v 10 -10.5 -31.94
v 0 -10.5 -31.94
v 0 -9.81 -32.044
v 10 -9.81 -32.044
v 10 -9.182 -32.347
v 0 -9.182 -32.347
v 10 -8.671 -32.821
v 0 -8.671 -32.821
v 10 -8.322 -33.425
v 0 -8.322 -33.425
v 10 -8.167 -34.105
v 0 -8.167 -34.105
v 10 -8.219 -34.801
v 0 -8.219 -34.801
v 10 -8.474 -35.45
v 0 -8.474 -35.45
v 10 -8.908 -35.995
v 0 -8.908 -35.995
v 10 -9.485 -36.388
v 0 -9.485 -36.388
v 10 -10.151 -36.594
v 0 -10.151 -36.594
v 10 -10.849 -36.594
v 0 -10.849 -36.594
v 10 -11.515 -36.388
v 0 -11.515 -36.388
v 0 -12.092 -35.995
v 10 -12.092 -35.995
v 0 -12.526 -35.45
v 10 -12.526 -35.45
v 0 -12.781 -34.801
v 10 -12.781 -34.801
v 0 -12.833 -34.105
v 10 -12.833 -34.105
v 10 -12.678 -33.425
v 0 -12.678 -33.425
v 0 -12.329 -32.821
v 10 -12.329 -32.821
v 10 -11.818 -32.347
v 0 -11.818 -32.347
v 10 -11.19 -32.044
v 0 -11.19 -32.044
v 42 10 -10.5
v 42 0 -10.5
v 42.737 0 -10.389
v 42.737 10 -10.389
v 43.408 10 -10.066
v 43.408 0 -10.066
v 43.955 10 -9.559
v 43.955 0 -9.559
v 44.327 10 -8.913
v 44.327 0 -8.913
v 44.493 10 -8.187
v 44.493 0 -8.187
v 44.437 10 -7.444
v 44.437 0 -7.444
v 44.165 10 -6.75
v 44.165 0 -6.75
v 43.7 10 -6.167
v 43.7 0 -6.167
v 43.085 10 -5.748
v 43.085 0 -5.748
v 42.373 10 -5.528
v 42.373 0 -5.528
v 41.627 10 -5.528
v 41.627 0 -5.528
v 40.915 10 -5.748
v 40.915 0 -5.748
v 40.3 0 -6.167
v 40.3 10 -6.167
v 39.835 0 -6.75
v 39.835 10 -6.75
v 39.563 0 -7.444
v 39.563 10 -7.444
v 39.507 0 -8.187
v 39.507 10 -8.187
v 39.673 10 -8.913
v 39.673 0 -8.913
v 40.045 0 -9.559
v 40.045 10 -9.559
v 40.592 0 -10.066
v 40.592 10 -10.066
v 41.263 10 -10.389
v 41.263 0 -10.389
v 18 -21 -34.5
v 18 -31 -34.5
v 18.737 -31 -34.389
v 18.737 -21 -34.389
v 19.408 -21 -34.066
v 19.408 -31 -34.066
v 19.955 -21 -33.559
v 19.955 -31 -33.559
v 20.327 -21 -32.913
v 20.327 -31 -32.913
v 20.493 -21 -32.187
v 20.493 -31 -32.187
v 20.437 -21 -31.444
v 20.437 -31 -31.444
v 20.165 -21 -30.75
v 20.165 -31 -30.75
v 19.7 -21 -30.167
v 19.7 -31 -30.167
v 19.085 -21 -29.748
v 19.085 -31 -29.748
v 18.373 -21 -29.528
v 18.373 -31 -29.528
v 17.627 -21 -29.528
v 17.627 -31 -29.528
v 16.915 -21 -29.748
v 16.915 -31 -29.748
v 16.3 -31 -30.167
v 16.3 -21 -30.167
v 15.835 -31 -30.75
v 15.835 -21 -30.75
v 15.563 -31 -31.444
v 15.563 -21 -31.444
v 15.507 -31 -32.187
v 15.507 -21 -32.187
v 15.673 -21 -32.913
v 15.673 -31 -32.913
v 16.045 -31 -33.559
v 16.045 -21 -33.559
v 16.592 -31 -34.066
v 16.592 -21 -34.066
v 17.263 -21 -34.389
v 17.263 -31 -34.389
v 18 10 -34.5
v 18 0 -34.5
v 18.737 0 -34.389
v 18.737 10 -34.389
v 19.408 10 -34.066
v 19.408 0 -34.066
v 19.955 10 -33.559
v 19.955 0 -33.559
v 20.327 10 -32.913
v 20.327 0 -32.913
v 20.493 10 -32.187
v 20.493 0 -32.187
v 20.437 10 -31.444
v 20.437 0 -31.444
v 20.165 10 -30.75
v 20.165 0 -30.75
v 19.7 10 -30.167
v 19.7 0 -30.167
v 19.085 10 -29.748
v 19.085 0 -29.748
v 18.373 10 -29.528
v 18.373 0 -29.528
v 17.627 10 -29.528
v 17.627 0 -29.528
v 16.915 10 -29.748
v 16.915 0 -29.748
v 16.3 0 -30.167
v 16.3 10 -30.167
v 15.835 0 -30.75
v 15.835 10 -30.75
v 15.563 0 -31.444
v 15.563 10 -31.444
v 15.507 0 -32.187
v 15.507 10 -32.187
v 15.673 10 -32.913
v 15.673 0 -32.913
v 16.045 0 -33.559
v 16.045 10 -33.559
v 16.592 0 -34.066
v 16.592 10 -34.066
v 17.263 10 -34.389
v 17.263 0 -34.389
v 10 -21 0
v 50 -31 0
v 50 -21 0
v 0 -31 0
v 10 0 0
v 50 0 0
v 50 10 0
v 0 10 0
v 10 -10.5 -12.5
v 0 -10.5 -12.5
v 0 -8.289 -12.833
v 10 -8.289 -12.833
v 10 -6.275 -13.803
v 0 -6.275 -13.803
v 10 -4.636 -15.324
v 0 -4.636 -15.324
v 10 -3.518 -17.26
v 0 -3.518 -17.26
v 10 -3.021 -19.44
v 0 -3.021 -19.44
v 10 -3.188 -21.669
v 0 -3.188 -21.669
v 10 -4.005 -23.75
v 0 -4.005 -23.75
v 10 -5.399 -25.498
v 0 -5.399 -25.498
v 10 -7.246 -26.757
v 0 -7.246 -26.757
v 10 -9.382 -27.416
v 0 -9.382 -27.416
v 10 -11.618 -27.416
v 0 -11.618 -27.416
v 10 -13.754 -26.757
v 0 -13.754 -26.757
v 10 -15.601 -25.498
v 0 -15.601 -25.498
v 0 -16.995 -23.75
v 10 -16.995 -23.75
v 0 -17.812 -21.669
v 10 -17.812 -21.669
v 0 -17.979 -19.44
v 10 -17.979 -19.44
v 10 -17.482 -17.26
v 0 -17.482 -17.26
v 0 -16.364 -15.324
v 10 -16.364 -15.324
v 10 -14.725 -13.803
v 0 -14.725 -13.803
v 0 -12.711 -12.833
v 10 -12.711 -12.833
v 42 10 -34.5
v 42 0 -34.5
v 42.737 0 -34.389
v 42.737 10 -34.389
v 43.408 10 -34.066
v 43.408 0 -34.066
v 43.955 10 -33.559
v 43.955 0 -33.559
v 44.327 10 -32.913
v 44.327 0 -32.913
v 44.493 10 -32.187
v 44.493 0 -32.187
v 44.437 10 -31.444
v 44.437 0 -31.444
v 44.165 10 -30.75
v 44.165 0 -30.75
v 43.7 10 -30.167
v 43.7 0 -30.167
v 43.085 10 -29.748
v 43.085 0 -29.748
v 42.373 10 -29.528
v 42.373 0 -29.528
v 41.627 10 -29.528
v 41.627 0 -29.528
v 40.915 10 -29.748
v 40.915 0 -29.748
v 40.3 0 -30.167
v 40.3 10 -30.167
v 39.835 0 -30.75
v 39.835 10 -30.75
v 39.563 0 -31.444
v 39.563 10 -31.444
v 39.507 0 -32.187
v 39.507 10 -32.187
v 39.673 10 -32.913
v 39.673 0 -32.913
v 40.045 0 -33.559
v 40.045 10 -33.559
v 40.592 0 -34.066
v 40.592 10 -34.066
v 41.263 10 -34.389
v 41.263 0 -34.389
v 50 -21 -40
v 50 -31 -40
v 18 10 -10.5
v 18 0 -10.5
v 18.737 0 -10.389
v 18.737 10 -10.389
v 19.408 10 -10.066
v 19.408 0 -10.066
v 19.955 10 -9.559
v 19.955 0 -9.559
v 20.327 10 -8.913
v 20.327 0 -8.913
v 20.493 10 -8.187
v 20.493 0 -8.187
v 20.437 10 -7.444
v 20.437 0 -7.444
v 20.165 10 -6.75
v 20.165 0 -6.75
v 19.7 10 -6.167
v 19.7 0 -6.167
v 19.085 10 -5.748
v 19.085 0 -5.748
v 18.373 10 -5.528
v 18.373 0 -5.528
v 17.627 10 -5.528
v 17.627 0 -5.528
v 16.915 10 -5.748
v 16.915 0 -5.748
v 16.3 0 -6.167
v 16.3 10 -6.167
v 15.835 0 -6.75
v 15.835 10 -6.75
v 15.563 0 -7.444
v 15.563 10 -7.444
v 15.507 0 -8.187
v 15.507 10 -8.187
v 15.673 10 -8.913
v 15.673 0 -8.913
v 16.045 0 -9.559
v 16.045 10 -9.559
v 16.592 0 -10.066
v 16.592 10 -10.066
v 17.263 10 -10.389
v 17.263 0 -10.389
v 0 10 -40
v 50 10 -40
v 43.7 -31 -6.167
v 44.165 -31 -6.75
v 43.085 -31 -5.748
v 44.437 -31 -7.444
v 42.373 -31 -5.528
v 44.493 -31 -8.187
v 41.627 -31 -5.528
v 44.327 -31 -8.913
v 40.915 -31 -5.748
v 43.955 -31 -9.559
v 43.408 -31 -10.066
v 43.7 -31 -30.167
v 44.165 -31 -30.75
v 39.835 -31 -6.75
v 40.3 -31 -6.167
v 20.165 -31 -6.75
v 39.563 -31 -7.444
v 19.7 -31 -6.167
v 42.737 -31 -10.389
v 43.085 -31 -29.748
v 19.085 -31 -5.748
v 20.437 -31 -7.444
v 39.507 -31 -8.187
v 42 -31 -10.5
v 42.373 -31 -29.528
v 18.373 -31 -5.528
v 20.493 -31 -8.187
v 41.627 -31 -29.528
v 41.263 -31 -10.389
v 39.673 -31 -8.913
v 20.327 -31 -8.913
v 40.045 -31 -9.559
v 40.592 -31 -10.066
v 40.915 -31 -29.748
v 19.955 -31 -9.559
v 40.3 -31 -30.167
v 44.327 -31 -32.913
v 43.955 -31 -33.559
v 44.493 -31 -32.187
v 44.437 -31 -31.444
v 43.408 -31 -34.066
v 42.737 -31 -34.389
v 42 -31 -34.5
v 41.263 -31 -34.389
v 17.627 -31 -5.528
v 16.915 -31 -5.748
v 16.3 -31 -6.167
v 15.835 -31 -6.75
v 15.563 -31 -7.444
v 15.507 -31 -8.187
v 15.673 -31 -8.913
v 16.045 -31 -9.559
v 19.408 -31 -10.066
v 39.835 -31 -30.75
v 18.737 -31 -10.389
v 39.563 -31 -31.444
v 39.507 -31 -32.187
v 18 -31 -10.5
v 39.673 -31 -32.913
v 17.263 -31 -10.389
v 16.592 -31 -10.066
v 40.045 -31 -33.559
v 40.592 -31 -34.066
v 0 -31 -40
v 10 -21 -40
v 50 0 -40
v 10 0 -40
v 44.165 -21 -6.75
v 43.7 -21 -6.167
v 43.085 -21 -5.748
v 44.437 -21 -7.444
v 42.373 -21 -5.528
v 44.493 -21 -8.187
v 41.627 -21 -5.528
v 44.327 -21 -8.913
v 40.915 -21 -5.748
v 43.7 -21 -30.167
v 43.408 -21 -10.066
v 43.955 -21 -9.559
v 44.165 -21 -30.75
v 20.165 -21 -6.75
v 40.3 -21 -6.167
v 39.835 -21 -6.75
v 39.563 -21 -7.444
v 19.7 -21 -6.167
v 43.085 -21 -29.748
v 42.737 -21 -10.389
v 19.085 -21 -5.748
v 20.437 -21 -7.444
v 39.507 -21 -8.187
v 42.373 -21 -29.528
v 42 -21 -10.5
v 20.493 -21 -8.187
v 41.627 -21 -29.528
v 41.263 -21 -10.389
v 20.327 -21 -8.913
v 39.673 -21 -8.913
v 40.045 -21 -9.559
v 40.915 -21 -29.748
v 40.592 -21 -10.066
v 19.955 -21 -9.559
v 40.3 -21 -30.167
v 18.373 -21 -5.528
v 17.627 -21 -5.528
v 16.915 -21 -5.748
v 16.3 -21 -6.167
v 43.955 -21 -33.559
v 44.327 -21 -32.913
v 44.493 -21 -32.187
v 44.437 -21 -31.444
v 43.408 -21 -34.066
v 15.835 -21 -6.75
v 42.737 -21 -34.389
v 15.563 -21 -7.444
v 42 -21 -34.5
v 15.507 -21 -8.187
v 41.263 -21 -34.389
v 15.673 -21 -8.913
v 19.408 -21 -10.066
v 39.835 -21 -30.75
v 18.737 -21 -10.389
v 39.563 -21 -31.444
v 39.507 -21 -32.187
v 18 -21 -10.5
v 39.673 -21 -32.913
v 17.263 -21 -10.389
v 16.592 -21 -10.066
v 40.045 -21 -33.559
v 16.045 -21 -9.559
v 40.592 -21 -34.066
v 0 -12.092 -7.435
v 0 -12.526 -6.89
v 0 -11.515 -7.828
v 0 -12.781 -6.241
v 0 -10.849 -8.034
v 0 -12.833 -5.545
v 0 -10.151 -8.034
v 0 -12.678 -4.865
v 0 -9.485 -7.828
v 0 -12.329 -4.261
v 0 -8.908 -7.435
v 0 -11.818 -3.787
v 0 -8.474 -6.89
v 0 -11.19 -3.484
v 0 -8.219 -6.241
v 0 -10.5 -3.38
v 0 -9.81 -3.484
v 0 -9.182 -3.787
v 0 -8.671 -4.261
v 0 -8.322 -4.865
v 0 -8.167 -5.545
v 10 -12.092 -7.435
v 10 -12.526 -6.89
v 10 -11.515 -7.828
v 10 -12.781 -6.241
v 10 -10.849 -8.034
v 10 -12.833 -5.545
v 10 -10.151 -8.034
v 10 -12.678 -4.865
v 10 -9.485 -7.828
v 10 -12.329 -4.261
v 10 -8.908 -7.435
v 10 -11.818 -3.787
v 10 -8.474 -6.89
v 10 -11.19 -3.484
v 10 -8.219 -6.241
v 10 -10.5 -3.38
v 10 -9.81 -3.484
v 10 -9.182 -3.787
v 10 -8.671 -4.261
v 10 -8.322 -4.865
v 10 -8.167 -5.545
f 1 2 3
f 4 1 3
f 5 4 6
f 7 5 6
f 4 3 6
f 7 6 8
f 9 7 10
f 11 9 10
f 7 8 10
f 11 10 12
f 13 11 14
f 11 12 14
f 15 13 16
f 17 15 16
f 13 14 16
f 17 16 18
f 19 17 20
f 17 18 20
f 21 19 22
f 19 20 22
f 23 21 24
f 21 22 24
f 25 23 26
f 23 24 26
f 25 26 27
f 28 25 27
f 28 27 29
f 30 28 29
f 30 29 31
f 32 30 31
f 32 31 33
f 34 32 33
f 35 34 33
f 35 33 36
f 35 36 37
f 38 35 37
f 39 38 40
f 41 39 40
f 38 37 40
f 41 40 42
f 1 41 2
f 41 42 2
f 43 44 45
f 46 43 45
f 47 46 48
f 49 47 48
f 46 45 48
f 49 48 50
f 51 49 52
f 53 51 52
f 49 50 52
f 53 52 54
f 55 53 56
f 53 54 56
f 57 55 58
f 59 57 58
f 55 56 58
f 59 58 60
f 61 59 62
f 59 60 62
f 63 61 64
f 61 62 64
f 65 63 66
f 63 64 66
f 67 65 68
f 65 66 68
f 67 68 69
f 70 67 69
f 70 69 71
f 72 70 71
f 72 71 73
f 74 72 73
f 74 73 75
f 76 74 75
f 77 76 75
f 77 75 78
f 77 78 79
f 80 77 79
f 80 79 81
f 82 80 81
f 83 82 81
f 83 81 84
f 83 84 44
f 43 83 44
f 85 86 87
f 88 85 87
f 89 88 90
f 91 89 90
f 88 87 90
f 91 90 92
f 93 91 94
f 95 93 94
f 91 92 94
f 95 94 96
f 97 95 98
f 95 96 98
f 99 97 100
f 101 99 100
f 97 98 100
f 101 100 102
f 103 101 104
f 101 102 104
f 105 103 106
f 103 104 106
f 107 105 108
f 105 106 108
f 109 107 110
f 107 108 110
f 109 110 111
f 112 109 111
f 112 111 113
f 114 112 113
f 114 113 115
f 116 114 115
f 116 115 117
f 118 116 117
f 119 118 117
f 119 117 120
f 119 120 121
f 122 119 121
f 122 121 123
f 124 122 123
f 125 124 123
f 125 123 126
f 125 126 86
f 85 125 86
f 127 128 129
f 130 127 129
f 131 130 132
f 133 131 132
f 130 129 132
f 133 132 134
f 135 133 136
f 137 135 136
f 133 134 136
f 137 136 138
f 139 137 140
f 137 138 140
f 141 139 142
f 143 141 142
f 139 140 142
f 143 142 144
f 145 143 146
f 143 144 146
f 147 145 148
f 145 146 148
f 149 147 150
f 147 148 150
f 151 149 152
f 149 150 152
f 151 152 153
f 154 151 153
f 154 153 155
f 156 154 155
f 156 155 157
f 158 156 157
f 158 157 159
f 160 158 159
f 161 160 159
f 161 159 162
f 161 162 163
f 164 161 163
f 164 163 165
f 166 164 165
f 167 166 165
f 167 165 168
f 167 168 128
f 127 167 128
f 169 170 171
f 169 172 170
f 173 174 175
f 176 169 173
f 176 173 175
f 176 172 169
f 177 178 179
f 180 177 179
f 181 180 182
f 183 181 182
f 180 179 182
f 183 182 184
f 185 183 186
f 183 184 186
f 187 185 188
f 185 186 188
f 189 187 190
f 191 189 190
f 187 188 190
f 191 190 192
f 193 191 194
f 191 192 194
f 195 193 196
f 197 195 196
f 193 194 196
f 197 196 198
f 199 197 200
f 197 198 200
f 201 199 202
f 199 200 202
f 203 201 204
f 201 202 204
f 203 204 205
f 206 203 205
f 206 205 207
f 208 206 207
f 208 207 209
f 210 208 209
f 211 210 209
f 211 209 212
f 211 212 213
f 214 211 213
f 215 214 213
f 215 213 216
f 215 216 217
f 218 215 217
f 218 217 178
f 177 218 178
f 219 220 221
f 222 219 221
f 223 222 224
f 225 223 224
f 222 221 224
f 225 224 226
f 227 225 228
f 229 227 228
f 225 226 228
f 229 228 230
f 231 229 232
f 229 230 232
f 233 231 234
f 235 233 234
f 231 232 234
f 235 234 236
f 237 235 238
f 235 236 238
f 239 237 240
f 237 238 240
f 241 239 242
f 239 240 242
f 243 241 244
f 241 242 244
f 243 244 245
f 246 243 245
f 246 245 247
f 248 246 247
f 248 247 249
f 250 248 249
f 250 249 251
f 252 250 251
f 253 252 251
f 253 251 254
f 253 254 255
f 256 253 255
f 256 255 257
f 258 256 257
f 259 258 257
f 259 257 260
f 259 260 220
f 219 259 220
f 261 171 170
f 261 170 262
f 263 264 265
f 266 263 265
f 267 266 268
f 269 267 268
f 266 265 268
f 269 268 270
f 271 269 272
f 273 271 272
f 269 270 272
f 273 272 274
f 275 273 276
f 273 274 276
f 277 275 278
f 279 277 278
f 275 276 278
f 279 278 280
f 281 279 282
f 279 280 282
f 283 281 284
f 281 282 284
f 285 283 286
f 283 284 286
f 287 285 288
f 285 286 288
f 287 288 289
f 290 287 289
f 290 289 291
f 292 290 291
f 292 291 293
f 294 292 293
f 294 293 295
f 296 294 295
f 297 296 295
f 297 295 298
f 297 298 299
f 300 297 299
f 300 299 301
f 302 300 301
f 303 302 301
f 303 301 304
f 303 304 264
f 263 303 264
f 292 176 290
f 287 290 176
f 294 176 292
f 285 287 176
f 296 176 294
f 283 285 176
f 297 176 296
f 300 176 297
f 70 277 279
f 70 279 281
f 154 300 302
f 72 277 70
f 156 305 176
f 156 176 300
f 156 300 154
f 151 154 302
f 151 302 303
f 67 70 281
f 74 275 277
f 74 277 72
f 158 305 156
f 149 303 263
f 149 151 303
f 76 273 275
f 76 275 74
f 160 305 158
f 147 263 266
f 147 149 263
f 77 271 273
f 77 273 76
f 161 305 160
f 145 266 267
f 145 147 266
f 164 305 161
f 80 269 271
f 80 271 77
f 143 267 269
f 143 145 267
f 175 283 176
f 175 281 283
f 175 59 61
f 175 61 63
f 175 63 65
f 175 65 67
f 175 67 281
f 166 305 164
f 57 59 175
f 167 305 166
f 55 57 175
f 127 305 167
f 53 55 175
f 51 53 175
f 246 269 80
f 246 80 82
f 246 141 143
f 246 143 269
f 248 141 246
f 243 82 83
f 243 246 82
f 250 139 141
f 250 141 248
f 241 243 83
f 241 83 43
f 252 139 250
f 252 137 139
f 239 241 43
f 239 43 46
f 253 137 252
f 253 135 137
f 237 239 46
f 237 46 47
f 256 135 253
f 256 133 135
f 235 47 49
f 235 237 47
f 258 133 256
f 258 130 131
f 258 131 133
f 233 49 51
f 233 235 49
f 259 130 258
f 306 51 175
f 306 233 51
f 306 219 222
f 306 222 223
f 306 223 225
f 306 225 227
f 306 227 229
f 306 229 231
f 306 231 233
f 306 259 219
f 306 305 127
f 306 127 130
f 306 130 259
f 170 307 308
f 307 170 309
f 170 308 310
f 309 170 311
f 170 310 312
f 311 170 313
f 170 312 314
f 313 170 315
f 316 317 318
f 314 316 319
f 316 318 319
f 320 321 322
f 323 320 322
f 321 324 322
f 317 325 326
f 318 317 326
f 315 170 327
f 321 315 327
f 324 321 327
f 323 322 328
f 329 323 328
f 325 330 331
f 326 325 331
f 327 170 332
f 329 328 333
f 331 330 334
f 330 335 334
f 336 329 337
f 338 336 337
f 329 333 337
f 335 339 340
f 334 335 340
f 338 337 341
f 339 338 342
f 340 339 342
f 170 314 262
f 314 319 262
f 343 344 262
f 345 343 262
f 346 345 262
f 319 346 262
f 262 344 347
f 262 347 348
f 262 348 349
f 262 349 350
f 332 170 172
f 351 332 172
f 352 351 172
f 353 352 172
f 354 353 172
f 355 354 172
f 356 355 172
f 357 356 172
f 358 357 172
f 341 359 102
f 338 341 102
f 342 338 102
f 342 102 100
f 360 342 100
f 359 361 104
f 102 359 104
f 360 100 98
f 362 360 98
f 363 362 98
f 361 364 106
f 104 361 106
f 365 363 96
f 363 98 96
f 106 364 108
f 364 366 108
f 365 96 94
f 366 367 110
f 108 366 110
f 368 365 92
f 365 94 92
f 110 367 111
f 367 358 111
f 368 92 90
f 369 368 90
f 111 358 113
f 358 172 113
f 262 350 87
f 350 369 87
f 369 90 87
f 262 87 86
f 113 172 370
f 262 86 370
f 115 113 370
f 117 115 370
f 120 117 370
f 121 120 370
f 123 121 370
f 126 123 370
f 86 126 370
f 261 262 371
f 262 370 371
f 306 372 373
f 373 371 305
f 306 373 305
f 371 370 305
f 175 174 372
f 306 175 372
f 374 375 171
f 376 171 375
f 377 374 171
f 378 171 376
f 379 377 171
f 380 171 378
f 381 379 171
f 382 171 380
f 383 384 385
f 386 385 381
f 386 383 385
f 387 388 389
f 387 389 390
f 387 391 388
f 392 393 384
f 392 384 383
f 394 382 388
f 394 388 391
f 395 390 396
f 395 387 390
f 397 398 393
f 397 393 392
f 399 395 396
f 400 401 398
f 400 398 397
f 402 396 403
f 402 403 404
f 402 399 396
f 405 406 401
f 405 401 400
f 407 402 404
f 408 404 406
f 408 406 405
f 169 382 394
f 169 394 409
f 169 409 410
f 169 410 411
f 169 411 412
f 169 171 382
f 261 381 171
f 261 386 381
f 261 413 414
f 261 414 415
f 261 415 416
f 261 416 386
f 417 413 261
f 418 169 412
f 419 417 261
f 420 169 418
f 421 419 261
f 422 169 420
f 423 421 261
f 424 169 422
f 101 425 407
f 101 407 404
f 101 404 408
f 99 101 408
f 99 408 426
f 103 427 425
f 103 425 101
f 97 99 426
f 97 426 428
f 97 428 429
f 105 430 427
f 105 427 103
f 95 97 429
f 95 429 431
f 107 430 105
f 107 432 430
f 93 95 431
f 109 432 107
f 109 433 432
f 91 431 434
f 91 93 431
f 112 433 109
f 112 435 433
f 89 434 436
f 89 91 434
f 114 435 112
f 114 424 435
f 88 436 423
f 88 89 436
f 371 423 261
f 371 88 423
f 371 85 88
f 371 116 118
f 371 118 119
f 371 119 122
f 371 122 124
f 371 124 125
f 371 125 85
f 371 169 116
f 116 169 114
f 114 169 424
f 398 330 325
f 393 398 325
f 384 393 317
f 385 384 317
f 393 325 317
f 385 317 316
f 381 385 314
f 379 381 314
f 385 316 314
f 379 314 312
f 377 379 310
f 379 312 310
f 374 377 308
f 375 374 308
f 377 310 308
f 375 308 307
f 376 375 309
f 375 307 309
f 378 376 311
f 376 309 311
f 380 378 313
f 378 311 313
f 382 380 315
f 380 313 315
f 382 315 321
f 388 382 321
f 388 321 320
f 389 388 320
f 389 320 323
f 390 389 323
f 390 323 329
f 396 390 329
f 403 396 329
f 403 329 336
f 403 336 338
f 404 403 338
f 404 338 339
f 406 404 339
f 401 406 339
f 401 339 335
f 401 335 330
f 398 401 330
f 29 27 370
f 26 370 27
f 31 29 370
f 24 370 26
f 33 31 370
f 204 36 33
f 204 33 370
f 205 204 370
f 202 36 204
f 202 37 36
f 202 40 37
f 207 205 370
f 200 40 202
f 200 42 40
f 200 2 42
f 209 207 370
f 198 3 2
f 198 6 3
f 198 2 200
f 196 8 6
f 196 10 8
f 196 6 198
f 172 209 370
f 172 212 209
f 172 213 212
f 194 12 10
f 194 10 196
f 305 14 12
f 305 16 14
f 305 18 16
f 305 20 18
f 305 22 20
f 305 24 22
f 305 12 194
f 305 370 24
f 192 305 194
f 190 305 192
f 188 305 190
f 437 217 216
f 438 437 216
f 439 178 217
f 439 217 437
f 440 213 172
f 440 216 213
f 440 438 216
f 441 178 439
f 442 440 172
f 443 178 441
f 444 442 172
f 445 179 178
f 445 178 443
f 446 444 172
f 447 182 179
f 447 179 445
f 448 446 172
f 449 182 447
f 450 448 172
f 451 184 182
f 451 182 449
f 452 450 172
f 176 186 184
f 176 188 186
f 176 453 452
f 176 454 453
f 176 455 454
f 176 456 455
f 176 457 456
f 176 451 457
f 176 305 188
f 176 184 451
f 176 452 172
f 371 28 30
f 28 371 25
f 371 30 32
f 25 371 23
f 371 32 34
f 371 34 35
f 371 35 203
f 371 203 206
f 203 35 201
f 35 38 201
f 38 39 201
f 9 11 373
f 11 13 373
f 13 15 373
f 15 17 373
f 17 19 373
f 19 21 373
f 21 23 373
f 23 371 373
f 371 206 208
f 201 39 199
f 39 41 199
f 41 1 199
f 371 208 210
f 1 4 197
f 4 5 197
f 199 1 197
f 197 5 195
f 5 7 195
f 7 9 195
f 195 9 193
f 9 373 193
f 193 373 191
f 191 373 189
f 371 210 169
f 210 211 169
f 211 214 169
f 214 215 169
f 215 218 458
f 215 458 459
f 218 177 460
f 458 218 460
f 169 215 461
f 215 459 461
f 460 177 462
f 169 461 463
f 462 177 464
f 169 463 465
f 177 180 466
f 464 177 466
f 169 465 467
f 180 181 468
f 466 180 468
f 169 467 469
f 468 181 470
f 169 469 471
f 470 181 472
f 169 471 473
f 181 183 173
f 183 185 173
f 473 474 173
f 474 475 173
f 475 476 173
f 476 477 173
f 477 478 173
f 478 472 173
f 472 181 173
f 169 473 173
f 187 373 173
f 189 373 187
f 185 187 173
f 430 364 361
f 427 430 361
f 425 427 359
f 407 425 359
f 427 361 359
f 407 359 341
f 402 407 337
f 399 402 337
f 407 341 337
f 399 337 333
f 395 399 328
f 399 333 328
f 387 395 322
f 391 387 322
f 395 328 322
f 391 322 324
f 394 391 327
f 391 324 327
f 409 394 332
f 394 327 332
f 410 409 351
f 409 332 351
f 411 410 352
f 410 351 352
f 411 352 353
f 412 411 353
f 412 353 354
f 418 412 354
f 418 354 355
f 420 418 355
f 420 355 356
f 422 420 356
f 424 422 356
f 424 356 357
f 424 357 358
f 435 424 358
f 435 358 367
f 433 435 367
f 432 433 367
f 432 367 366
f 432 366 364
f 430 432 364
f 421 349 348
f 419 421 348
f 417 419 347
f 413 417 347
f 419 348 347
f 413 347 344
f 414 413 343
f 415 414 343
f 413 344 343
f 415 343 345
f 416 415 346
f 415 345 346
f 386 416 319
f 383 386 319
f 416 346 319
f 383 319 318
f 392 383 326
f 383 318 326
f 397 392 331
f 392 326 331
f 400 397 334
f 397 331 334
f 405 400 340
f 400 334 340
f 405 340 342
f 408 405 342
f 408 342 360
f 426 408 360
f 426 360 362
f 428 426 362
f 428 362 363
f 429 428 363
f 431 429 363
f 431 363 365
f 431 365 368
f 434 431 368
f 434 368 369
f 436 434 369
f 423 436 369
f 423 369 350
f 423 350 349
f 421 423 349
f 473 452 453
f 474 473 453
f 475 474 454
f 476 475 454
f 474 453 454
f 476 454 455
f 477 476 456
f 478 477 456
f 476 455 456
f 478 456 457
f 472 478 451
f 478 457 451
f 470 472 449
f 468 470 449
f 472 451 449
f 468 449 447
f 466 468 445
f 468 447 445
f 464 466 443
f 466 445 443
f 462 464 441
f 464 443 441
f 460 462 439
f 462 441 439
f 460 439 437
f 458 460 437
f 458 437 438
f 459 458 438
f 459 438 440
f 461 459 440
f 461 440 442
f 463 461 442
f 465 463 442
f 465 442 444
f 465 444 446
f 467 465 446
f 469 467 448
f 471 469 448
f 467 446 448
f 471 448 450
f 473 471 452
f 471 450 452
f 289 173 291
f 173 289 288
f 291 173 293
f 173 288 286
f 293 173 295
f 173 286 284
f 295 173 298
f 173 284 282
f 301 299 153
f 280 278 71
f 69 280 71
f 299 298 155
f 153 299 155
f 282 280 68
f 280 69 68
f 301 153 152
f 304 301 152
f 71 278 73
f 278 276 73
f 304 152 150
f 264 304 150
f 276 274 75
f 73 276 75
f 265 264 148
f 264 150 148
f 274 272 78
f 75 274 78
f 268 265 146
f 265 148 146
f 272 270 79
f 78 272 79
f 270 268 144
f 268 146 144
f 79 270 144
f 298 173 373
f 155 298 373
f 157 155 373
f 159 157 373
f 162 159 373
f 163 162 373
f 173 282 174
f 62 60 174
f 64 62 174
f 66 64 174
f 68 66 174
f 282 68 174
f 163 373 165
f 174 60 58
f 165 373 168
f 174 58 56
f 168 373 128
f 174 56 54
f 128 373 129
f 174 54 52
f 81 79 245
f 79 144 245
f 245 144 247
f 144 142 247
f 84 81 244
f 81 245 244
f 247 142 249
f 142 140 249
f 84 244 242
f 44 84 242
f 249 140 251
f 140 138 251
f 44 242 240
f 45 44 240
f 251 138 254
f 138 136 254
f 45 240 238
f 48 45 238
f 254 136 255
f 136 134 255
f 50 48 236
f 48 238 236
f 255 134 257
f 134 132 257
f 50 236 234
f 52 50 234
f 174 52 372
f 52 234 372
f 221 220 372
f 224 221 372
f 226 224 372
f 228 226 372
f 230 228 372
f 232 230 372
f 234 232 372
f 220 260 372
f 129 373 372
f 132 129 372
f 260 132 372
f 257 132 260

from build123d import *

# Parameters (mm, degrees)
SKETCH1_W           = 50
SKETCH1_H           = 40
BOSS_EXTRUDE1_DEPTH = 10
SKETCH2_W           = 10
SKETCH2_H           = 40
BOSS_EXTRUDE2_DEPTH = 21
SKETCH4_W           = 10
SKETCH4_H           = 40
BOSS_EXTRUDE3_DEPTH = 10
SKETCH5_W           = 40
SKETCH5_H           = 10
BOSS_EXTRUDE4_DEPTH = 40
SKETCH6_R           = 7.5
SKETCH6_R_2         = 2.5
CUT_EXTRUDE1_DEPTH  = 40
SKETCH7_R           = 2.5
CUT_EXTRUDE2_DEPTH  = 77.032887621
SKETCH8_R           = 2.5
SKETCH8_R_2         = 2.34
BOSS_EXTRUDE5_DEPTH = 10


with BuildPart() as part:
    # Sketch1 → Boss-Extrude1 (new body)
    with BuildSketch(Plane(origin=(0, 0, 0), x_dir=(1, 0, 0), z_dir=(0, 1, 0))):
        with Locations((25, 20)):
            Rectangle(SKETCH1_W, SKETCH1_H)
    extrude(amount=BOSS_EXTRUDE1_DEPTH)

    # Sketch2 → Boss-Extrude2 (add)
    with BuildSketch(Plane.XZ):
        with Locations((5, -20)):
            Rectangle(SKETCH2_W, SKETCH2_H)
    extrude(amount=BOSS_EXTRUDE2_DEPTH)

    # Sketch4 → Boss-Extrude3 (add)
    with BuildSketch(Plane.XZ.offset(21)):
        with Locations((5, -20)):
            Rectangle(SKETCH4_W, SKETCH4_H)
    extrude(amount=BOSS_EXTRUDE3_DEPTH)

    # Sketch5 → Boss-Extrude4 (add)
    with BuildSketch(Plane(origin=(10, 0, 0), x_dir=(0, 0, -1), z_dir=(1, 0, 0))):
        with Locations((20, -26)):
            Rectangle(SKETCH5_W, SKETCH5_H)
    extrude(amount=BOSS_EXTRUDE4_DEPTH)

    # Sketch6 → Cut-Extrude1 (cut)
    with BuildSketch(Plane.ZY):
        with Locations((-20, -10.5)):
            Circle(SKETCH6_R)
        with Locations((-34.28, -10.5)):
            Circle(SKETCH6_R_2)
        with Locations((-5.72, -10.5)):
            Circle(SKETCH6_R_2)
    extrude(amount=-CUT_EXTRUDE1_DEPTH, mode=Mode.SUBTRACT)

    # Sketch7 → Cut-Extrude2 (cut, through all)
    with BuildSketch(Plane.XZ.offset(31)):
        with Locations(Location((18, -8, 0), (0, 0, 270))):
            Circle(SKETCH7_R)
        with Locations(Location((42, -8, 0), (0, 0, 270))):
            Circle(SKETCH7_R)
        with Locations(Location((18, -32, 0), (0, 0, 270))):
            Circle(SKETCH7_R)
        with Locations(Location((42, -32, 0), (0, 0, 270))):
            Circle(SKETCH7_R)
    extrude(amount=-CUT_EXTRUDE2_DEPTH, mode=Mode.SUBTRACT)

    # Sketch8 → Boss-Extrude5 (add)
    # profile 1 of 2: a face of its own
    with BuildSketch(Plane.ZY):
        with Locations((-34.28, -10.5)):
            Circle(SKETCH8_R)
        with Locations((-34.28, -10.5)):
            Circle(SKETCH8_R_2, mode=Mode.SUBTRACT)
    # profile 2 of 2: a face of its own
    with BuildSketch(Plane.ZY):
        with Locations((-5.72, -10.5)):
            Circle(SKETCH8_R)
        with Locations((-5.72, -10.5)):
            Circle(SKETCH8_R_2, mode=Mode.SUBTRACT)
    extrude(amount=-BOSS_EXTRUDE5_DEPTH)


solid = part.part
